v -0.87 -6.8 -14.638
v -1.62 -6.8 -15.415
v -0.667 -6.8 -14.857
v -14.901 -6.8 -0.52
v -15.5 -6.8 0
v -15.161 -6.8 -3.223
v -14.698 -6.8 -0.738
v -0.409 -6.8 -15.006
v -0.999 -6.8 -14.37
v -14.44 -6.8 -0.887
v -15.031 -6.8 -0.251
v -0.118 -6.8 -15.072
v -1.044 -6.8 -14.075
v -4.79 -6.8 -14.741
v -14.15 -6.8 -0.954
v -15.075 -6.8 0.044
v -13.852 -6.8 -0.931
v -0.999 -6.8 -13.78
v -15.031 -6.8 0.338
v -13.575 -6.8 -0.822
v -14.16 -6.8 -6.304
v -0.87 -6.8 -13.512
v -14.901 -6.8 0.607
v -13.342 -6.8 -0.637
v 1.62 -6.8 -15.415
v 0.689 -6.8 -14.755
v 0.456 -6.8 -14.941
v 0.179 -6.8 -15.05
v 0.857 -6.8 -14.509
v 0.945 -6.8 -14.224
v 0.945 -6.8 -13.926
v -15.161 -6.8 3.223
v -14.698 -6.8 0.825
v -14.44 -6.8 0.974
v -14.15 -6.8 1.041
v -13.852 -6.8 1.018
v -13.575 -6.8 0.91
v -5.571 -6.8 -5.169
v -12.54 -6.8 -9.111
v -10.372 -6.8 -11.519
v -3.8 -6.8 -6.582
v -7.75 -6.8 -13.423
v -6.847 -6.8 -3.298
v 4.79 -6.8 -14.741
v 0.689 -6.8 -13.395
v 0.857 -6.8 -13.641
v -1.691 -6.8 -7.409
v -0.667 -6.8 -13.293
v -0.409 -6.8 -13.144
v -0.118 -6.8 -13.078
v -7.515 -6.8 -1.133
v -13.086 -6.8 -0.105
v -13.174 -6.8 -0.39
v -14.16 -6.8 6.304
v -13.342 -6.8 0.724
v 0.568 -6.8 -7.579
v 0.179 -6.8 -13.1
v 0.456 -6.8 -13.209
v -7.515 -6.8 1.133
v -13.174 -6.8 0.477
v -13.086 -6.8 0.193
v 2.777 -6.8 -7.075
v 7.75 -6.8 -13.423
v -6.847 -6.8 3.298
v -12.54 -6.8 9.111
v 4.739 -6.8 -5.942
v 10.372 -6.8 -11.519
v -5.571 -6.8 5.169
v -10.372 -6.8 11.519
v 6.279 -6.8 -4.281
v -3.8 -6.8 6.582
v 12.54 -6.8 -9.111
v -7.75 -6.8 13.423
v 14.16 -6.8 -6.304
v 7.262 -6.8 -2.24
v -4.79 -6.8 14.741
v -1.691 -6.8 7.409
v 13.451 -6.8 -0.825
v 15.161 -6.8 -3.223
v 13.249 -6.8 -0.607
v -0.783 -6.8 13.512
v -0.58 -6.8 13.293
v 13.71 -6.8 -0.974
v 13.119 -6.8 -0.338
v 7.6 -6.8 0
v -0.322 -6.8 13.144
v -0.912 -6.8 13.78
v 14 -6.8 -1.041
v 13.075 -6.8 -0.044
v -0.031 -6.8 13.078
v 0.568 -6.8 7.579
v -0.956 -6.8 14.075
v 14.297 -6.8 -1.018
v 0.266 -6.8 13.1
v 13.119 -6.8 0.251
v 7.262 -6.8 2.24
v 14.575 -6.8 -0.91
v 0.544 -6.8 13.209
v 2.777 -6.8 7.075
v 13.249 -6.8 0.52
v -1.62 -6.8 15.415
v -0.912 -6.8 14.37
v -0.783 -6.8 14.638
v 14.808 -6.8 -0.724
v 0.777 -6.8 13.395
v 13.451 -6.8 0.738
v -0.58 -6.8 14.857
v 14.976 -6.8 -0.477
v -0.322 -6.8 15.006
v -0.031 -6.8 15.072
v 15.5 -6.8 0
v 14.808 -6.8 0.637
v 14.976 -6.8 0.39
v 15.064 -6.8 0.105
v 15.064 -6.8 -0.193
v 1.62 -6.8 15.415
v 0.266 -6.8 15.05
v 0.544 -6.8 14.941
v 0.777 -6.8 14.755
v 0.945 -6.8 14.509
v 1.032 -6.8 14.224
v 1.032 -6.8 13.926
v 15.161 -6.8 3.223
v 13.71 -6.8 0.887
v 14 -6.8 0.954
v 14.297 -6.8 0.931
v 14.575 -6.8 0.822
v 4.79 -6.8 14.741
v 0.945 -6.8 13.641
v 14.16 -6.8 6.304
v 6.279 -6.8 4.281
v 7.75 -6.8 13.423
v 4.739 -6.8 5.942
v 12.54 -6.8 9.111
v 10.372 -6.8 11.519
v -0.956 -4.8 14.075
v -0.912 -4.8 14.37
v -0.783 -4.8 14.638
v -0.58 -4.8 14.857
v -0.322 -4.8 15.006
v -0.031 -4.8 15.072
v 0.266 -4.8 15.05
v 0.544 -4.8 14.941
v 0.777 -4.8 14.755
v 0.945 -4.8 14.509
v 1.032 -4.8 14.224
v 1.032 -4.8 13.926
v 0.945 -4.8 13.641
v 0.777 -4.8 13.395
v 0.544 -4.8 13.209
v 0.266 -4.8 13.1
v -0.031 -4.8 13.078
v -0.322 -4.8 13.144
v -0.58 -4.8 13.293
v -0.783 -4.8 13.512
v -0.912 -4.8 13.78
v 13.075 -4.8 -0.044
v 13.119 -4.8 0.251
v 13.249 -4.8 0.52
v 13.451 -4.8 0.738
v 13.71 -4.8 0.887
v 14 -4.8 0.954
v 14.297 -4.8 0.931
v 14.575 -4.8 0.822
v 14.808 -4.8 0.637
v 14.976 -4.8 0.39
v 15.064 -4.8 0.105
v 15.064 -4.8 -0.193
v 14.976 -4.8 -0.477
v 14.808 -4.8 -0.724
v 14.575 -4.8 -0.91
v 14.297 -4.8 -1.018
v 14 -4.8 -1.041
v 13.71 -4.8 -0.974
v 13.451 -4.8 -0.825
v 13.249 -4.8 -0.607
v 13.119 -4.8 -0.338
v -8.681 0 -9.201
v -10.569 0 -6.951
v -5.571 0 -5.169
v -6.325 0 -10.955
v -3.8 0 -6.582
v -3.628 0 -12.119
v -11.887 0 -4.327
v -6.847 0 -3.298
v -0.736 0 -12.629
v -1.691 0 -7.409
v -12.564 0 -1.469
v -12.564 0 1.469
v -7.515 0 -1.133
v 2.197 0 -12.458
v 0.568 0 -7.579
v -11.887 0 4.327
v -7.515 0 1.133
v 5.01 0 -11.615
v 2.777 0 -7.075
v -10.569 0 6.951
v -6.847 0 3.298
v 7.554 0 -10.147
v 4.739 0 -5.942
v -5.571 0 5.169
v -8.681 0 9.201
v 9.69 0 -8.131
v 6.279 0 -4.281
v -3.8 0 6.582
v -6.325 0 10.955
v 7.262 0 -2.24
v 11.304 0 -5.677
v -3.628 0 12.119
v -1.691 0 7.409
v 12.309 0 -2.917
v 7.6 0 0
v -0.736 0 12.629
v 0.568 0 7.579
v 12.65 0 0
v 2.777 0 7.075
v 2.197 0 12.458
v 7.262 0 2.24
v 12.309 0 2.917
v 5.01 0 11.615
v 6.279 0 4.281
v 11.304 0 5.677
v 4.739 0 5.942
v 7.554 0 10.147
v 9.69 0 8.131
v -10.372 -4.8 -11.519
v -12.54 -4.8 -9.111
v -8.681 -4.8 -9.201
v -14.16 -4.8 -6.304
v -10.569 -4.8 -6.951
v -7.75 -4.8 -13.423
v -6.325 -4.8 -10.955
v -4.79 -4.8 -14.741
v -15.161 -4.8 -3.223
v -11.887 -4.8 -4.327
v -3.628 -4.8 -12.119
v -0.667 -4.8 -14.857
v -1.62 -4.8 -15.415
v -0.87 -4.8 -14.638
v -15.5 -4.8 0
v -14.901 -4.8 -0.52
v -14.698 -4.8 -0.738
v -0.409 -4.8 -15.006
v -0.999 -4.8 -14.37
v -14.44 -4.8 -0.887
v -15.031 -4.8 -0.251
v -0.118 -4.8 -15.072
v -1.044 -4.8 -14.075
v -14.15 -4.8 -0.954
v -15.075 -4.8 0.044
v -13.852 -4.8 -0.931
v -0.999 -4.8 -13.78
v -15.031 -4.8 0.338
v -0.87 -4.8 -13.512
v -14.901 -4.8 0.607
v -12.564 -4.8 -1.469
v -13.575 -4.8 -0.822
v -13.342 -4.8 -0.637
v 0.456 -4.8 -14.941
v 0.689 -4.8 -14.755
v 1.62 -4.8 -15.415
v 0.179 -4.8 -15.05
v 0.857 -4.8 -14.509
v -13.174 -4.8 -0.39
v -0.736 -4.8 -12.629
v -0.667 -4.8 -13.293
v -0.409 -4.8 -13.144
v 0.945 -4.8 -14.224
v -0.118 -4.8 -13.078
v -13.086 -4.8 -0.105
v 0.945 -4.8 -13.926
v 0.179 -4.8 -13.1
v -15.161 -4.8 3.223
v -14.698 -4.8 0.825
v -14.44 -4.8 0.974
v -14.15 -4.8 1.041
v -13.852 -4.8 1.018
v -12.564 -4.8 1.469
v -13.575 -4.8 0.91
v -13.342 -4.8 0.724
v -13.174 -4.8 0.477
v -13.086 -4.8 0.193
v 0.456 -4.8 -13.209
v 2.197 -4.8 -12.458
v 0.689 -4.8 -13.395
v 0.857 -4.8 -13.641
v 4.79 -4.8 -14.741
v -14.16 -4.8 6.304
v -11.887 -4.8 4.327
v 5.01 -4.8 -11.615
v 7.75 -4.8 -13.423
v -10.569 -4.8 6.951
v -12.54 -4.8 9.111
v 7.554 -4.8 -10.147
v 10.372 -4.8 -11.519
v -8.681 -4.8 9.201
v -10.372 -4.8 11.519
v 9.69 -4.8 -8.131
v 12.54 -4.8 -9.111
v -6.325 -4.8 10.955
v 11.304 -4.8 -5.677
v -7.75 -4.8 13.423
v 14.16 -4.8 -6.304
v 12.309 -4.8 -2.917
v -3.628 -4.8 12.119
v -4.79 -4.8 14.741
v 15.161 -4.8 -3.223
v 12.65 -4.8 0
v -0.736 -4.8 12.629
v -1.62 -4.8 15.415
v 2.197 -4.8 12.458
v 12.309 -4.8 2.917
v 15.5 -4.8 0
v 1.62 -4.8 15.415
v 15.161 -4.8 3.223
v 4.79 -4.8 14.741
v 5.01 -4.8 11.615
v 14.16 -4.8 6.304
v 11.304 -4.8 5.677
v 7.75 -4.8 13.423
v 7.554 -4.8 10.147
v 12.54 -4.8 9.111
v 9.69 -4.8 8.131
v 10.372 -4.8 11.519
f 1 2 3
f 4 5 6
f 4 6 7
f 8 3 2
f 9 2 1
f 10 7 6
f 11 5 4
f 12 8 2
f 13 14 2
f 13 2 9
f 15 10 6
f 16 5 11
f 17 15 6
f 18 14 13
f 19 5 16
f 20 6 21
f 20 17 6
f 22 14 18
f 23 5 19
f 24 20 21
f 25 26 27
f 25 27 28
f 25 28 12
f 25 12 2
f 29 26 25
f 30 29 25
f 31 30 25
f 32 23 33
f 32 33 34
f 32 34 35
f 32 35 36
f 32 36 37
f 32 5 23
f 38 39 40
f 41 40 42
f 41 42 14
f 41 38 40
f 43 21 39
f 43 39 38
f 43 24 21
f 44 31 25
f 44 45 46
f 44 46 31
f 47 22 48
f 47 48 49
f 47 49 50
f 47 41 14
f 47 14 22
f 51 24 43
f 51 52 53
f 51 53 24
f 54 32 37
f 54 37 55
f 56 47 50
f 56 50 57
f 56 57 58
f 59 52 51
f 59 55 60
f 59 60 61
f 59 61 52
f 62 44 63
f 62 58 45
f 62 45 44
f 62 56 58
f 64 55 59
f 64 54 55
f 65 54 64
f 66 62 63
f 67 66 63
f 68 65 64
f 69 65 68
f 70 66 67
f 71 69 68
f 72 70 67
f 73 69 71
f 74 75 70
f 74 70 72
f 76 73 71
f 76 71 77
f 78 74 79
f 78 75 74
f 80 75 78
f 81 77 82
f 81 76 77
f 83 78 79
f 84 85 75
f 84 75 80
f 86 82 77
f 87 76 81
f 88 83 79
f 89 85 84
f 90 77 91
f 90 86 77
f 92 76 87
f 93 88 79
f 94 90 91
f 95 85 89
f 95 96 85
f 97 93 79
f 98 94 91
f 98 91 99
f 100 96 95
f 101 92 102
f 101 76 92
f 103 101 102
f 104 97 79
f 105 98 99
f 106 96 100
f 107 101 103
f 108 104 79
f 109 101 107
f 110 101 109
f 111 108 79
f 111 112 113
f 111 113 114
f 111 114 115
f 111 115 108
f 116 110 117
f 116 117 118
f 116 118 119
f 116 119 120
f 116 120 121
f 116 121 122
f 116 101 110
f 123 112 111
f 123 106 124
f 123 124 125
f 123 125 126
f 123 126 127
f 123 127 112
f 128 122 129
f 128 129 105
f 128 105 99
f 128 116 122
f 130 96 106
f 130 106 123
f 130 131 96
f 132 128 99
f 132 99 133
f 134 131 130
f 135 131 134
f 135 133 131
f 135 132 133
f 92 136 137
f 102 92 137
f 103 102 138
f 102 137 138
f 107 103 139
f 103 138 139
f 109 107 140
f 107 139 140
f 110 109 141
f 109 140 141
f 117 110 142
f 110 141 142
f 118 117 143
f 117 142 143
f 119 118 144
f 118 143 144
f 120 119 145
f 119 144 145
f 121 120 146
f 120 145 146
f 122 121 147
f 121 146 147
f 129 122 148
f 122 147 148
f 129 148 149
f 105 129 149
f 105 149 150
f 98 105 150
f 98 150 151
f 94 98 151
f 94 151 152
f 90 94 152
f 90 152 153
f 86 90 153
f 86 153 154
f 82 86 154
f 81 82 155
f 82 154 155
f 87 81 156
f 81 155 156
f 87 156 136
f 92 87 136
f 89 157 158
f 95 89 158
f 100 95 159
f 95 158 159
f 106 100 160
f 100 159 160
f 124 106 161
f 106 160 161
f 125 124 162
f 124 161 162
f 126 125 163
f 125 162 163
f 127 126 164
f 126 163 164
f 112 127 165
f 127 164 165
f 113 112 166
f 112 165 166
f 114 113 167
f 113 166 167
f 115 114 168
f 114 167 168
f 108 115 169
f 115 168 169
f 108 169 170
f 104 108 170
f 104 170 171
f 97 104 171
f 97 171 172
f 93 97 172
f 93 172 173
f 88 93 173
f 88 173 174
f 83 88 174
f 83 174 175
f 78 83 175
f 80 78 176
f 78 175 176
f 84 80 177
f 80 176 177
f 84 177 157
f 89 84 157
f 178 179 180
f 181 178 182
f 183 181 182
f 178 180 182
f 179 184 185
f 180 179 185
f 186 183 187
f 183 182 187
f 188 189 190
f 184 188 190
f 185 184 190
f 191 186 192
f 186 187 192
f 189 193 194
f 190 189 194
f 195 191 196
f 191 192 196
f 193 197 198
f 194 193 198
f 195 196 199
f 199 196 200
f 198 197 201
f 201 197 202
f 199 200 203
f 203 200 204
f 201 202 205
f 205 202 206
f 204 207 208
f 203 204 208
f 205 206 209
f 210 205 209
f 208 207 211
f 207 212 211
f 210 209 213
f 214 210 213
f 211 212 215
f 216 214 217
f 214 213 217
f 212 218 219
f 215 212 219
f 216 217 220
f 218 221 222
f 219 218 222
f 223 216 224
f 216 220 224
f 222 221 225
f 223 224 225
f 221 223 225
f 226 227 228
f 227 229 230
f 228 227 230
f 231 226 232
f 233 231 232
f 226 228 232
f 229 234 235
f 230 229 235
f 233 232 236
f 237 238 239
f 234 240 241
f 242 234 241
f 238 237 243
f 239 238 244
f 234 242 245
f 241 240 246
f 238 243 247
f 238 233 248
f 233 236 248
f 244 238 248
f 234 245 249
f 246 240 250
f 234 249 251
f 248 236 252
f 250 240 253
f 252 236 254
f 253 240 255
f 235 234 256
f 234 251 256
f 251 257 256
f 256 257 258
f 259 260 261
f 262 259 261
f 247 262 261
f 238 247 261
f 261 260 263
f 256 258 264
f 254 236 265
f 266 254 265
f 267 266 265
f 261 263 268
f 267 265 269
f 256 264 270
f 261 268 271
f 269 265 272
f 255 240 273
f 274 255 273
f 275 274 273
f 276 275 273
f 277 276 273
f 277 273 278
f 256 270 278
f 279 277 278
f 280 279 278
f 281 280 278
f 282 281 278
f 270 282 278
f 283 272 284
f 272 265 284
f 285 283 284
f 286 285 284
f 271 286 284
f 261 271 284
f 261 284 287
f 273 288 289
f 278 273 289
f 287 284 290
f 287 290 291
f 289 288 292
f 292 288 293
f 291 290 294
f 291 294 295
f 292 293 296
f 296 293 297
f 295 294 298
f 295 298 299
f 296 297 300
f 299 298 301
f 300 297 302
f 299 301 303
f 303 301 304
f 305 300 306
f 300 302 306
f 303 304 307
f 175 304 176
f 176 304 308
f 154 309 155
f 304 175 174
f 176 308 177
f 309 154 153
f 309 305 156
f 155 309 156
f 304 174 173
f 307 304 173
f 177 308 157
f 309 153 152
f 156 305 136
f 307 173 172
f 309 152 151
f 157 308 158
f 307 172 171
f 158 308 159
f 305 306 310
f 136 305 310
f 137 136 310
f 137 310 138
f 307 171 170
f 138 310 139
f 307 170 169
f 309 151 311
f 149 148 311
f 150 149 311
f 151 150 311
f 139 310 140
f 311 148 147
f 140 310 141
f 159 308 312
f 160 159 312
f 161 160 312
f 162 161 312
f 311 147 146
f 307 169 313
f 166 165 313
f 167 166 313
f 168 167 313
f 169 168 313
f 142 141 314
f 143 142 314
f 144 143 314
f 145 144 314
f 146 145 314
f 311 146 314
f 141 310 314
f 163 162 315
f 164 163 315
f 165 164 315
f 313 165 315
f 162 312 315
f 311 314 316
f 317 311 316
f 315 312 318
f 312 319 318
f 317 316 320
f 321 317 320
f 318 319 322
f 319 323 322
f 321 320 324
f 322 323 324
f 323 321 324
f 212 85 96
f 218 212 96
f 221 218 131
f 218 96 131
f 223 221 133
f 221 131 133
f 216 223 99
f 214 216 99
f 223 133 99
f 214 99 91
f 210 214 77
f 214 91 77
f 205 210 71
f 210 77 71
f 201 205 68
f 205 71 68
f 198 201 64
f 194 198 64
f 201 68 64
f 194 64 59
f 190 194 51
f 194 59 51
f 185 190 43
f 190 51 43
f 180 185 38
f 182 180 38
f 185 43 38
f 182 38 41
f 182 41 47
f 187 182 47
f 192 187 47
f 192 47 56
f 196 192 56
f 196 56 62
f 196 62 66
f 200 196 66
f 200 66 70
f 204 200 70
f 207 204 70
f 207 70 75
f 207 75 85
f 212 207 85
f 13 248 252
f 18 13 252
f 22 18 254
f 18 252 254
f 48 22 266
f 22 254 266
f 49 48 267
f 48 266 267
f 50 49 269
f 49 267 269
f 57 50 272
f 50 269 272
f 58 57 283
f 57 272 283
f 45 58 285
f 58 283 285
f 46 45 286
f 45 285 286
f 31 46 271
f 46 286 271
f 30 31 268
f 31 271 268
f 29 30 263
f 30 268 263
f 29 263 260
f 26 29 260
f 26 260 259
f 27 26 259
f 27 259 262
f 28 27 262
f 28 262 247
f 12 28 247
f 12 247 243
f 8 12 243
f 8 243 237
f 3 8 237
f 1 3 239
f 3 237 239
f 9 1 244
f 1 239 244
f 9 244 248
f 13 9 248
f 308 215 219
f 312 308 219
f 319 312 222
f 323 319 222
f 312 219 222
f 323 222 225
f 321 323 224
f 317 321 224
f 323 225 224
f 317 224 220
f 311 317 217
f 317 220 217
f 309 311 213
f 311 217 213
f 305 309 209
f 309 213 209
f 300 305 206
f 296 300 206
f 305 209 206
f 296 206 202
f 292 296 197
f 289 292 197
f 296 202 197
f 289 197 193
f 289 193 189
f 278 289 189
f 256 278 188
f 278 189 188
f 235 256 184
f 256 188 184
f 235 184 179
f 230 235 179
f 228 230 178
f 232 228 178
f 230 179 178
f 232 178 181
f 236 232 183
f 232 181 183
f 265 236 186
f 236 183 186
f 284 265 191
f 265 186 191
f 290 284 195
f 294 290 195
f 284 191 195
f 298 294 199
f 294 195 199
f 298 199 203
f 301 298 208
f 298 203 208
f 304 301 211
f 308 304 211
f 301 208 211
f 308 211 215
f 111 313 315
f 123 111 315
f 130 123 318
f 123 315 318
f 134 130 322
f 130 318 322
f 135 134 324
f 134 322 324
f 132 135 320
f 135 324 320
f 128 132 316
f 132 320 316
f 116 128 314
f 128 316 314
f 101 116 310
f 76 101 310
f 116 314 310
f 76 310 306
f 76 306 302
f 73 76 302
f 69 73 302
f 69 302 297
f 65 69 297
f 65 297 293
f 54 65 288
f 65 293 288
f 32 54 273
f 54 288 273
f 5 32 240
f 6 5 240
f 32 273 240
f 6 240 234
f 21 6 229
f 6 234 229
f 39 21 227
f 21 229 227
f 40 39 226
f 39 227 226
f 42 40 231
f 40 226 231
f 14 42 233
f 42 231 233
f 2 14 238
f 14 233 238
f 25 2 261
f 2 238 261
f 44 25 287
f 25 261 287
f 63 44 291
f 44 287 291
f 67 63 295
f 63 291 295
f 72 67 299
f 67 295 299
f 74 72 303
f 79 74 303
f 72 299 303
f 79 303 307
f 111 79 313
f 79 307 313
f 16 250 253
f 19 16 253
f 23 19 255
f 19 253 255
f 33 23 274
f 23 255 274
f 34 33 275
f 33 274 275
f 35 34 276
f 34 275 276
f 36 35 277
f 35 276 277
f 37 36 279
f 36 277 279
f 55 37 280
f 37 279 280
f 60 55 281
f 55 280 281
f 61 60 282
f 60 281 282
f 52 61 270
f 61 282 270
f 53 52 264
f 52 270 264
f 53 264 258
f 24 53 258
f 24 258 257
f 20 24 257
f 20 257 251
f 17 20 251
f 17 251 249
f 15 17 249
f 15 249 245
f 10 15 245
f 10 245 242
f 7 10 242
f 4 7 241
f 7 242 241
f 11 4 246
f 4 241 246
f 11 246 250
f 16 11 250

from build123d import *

# Parameters (mm, degrees)
F0_R     = 12.65
F1_DEPTH = 4.8
F2_R     = 15.5
F2_R_2   = 12.65
F3_DEPTH = 2
F4_R     = 1
F5_DEPTH = 2
F6_R     = 7.6
F7_DEPTH = 7


# Not quite as in the source:
# - a feature names something its author has since deleted; it is built from what else it names


with BuildPart() as f1:
    # F0 (on Front) → F1 (new body)
    with BuildSketch(Plane.XZ):
        Circle(F0_R)
    extrude(amount=F1_DEPTH)

    # F2 (on face) → F3 (join)
    with BuildSketch(Plane.XZ.offset(4.8)):
        Circle(F2_R)
        Circle(F2_R_2, mode=Mode.SUBTRACT)
        Circle(F2_R_2)
    extrude(amount=F3_DEPTH)

    # F4 (on face) → F5 (cut)
    with BuildSketch(Plane(origin=(0, -4.8, 0), x_dir=(-1, 0, 0), z_dir=(0, 1, 0))):
        with Locations((-0.0435703545, 14.074932562)):
            Circle(F4_R)
        with Locations((-14.074932562, -0.0435703545)):
            Circle(F4_R)
        with Locations((0.0435703545, -14.074932562)):
            Circle(F4_R)
        with Locations((14.074932562, 0.0435703545)):
            Circle(F4_R)
    extrude(amount=-F5_DEPTH, mode=Mode.SUBTRACT)

    # F6 (on face) → F7 (cut)
    with BuildSketch(Plane.XZ.offset(6.8)):
        Circle(F6_R)
    extrude(amount=-F7_DEPTH, mode=Mode.SUBTRACT)


solid = f1.part
